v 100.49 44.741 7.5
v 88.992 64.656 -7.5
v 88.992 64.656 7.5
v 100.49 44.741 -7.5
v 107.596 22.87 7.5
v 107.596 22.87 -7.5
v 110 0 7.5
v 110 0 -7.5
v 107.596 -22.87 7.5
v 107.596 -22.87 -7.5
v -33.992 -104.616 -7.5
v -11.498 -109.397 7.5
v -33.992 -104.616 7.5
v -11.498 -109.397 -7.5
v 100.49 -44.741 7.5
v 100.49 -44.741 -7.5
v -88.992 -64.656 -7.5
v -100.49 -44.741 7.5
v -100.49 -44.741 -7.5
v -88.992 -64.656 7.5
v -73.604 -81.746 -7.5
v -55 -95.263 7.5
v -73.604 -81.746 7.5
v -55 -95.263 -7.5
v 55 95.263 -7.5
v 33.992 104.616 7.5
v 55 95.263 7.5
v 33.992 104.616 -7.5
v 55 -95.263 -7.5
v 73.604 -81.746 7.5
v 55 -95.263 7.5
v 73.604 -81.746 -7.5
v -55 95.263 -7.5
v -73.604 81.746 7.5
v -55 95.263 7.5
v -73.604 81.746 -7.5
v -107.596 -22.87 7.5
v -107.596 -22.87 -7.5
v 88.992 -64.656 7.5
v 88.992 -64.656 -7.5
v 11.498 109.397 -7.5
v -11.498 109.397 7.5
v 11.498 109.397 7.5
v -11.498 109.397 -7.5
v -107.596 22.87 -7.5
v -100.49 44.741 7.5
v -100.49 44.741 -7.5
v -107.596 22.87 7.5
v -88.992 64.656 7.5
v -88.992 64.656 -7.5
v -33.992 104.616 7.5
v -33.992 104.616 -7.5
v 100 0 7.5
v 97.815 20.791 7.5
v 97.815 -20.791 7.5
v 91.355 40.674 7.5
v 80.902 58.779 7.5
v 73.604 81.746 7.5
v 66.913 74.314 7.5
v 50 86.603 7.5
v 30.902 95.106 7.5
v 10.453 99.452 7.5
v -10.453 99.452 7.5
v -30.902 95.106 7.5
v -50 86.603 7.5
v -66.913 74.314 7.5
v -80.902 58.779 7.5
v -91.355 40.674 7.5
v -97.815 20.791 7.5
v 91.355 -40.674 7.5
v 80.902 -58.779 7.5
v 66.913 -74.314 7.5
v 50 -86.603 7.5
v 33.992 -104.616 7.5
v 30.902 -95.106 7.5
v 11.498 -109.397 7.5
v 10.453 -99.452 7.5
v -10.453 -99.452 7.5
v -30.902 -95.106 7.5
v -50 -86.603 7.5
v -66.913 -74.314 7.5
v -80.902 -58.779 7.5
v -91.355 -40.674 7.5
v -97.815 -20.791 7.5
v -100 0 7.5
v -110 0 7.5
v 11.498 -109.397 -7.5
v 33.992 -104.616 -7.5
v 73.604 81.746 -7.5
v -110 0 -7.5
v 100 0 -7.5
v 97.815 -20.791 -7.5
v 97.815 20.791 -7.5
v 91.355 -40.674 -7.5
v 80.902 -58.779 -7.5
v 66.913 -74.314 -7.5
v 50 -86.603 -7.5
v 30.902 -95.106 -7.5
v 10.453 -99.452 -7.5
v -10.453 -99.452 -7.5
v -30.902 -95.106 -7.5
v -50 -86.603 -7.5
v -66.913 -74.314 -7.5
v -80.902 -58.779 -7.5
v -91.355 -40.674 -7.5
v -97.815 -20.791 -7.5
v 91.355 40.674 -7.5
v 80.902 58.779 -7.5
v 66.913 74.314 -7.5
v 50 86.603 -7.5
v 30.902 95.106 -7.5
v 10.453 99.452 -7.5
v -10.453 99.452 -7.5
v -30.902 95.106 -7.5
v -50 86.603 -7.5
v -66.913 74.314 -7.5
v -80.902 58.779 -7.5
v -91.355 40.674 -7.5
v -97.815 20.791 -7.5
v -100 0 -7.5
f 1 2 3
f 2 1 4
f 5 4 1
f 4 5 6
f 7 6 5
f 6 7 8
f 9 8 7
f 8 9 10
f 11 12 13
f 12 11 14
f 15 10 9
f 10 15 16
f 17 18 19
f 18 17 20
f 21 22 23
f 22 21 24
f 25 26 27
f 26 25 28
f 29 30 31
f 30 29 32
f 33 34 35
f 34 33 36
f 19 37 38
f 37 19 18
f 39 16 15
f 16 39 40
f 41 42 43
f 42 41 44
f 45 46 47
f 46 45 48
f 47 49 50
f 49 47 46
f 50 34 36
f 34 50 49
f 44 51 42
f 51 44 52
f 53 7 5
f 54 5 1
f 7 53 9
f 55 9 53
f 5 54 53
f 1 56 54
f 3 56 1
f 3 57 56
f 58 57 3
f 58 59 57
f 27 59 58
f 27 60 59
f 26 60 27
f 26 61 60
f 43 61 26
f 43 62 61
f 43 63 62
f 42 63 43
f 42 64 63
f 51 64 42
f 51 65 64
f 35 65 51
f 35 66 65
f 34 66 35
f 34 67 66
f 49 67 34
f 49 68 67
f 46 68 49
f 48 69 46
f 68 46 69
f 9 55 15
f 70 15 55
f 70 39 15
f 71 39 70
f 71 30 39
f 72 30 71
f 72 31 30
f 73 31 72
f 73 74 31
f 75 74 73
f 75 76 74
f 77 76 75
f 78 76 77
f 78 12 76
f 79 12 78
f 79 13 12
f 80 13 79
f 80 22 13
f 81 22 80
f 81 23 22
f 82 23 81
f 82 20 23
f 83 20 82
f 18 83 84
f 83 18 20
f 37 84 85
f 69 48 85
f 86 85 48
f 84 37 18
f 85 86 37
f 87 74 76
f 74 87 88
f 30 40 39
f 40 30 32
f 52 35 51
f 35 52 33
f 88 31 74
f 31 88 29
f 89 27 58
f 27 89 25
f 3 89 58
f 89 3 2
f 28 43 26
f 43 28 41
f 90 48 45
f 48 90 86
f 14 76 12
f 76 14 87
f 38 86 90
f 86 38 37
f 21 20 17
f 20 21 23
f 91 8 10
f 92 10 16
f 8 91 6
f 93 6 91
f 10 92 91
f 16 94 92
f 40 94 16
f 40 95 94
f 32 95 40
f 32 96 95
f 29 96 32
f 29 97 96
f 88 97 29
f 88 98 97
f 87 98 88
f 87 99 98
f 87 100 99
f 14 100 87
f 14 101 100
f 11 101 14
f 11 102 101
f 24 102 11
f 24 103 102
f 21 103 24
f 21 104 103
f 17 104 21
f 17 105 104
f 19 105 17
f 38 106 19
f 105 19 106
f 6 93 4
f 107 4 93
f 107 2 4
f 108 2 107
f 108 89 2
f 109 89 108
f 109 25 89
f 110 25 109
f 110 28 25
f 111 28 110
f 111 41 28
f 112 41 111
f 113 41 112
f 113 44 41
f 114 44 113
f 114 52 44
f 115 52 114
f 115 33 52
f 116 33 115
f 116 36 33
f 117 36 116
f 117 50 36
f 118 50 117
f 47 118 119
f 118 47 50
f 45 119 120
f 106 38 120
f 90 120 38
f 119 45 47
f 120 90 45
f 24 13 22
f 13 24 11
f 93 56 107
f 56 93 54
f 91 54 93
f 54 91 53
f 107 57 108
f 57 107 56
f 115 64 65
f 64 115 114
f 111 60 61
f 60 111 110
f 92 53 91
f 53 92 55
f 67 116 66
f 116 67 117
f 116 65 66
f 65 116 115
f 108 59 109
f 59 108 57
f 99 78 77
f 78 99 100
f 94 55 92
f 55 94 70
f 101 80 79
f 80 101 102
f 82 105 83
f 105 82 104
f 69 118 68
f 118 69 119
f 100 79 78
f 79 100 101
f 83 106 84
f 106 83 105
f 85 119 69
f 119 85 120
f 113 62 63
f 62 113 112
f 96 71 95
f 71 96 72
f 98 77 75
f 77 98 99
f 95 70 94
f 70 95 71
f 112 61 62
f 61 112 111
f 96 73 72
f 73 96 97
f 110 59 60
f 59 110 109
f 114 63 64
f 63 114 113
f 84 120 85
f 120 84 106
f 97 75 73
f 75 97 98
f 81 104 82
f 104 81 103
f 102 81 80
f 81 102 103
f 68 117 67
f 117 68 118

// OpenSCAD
//Wrist circumference
W=100;

difference(){
cylinder(15,W+10,W+10,center=true);
    cylinder(15,W,W,center=true);
}
;
